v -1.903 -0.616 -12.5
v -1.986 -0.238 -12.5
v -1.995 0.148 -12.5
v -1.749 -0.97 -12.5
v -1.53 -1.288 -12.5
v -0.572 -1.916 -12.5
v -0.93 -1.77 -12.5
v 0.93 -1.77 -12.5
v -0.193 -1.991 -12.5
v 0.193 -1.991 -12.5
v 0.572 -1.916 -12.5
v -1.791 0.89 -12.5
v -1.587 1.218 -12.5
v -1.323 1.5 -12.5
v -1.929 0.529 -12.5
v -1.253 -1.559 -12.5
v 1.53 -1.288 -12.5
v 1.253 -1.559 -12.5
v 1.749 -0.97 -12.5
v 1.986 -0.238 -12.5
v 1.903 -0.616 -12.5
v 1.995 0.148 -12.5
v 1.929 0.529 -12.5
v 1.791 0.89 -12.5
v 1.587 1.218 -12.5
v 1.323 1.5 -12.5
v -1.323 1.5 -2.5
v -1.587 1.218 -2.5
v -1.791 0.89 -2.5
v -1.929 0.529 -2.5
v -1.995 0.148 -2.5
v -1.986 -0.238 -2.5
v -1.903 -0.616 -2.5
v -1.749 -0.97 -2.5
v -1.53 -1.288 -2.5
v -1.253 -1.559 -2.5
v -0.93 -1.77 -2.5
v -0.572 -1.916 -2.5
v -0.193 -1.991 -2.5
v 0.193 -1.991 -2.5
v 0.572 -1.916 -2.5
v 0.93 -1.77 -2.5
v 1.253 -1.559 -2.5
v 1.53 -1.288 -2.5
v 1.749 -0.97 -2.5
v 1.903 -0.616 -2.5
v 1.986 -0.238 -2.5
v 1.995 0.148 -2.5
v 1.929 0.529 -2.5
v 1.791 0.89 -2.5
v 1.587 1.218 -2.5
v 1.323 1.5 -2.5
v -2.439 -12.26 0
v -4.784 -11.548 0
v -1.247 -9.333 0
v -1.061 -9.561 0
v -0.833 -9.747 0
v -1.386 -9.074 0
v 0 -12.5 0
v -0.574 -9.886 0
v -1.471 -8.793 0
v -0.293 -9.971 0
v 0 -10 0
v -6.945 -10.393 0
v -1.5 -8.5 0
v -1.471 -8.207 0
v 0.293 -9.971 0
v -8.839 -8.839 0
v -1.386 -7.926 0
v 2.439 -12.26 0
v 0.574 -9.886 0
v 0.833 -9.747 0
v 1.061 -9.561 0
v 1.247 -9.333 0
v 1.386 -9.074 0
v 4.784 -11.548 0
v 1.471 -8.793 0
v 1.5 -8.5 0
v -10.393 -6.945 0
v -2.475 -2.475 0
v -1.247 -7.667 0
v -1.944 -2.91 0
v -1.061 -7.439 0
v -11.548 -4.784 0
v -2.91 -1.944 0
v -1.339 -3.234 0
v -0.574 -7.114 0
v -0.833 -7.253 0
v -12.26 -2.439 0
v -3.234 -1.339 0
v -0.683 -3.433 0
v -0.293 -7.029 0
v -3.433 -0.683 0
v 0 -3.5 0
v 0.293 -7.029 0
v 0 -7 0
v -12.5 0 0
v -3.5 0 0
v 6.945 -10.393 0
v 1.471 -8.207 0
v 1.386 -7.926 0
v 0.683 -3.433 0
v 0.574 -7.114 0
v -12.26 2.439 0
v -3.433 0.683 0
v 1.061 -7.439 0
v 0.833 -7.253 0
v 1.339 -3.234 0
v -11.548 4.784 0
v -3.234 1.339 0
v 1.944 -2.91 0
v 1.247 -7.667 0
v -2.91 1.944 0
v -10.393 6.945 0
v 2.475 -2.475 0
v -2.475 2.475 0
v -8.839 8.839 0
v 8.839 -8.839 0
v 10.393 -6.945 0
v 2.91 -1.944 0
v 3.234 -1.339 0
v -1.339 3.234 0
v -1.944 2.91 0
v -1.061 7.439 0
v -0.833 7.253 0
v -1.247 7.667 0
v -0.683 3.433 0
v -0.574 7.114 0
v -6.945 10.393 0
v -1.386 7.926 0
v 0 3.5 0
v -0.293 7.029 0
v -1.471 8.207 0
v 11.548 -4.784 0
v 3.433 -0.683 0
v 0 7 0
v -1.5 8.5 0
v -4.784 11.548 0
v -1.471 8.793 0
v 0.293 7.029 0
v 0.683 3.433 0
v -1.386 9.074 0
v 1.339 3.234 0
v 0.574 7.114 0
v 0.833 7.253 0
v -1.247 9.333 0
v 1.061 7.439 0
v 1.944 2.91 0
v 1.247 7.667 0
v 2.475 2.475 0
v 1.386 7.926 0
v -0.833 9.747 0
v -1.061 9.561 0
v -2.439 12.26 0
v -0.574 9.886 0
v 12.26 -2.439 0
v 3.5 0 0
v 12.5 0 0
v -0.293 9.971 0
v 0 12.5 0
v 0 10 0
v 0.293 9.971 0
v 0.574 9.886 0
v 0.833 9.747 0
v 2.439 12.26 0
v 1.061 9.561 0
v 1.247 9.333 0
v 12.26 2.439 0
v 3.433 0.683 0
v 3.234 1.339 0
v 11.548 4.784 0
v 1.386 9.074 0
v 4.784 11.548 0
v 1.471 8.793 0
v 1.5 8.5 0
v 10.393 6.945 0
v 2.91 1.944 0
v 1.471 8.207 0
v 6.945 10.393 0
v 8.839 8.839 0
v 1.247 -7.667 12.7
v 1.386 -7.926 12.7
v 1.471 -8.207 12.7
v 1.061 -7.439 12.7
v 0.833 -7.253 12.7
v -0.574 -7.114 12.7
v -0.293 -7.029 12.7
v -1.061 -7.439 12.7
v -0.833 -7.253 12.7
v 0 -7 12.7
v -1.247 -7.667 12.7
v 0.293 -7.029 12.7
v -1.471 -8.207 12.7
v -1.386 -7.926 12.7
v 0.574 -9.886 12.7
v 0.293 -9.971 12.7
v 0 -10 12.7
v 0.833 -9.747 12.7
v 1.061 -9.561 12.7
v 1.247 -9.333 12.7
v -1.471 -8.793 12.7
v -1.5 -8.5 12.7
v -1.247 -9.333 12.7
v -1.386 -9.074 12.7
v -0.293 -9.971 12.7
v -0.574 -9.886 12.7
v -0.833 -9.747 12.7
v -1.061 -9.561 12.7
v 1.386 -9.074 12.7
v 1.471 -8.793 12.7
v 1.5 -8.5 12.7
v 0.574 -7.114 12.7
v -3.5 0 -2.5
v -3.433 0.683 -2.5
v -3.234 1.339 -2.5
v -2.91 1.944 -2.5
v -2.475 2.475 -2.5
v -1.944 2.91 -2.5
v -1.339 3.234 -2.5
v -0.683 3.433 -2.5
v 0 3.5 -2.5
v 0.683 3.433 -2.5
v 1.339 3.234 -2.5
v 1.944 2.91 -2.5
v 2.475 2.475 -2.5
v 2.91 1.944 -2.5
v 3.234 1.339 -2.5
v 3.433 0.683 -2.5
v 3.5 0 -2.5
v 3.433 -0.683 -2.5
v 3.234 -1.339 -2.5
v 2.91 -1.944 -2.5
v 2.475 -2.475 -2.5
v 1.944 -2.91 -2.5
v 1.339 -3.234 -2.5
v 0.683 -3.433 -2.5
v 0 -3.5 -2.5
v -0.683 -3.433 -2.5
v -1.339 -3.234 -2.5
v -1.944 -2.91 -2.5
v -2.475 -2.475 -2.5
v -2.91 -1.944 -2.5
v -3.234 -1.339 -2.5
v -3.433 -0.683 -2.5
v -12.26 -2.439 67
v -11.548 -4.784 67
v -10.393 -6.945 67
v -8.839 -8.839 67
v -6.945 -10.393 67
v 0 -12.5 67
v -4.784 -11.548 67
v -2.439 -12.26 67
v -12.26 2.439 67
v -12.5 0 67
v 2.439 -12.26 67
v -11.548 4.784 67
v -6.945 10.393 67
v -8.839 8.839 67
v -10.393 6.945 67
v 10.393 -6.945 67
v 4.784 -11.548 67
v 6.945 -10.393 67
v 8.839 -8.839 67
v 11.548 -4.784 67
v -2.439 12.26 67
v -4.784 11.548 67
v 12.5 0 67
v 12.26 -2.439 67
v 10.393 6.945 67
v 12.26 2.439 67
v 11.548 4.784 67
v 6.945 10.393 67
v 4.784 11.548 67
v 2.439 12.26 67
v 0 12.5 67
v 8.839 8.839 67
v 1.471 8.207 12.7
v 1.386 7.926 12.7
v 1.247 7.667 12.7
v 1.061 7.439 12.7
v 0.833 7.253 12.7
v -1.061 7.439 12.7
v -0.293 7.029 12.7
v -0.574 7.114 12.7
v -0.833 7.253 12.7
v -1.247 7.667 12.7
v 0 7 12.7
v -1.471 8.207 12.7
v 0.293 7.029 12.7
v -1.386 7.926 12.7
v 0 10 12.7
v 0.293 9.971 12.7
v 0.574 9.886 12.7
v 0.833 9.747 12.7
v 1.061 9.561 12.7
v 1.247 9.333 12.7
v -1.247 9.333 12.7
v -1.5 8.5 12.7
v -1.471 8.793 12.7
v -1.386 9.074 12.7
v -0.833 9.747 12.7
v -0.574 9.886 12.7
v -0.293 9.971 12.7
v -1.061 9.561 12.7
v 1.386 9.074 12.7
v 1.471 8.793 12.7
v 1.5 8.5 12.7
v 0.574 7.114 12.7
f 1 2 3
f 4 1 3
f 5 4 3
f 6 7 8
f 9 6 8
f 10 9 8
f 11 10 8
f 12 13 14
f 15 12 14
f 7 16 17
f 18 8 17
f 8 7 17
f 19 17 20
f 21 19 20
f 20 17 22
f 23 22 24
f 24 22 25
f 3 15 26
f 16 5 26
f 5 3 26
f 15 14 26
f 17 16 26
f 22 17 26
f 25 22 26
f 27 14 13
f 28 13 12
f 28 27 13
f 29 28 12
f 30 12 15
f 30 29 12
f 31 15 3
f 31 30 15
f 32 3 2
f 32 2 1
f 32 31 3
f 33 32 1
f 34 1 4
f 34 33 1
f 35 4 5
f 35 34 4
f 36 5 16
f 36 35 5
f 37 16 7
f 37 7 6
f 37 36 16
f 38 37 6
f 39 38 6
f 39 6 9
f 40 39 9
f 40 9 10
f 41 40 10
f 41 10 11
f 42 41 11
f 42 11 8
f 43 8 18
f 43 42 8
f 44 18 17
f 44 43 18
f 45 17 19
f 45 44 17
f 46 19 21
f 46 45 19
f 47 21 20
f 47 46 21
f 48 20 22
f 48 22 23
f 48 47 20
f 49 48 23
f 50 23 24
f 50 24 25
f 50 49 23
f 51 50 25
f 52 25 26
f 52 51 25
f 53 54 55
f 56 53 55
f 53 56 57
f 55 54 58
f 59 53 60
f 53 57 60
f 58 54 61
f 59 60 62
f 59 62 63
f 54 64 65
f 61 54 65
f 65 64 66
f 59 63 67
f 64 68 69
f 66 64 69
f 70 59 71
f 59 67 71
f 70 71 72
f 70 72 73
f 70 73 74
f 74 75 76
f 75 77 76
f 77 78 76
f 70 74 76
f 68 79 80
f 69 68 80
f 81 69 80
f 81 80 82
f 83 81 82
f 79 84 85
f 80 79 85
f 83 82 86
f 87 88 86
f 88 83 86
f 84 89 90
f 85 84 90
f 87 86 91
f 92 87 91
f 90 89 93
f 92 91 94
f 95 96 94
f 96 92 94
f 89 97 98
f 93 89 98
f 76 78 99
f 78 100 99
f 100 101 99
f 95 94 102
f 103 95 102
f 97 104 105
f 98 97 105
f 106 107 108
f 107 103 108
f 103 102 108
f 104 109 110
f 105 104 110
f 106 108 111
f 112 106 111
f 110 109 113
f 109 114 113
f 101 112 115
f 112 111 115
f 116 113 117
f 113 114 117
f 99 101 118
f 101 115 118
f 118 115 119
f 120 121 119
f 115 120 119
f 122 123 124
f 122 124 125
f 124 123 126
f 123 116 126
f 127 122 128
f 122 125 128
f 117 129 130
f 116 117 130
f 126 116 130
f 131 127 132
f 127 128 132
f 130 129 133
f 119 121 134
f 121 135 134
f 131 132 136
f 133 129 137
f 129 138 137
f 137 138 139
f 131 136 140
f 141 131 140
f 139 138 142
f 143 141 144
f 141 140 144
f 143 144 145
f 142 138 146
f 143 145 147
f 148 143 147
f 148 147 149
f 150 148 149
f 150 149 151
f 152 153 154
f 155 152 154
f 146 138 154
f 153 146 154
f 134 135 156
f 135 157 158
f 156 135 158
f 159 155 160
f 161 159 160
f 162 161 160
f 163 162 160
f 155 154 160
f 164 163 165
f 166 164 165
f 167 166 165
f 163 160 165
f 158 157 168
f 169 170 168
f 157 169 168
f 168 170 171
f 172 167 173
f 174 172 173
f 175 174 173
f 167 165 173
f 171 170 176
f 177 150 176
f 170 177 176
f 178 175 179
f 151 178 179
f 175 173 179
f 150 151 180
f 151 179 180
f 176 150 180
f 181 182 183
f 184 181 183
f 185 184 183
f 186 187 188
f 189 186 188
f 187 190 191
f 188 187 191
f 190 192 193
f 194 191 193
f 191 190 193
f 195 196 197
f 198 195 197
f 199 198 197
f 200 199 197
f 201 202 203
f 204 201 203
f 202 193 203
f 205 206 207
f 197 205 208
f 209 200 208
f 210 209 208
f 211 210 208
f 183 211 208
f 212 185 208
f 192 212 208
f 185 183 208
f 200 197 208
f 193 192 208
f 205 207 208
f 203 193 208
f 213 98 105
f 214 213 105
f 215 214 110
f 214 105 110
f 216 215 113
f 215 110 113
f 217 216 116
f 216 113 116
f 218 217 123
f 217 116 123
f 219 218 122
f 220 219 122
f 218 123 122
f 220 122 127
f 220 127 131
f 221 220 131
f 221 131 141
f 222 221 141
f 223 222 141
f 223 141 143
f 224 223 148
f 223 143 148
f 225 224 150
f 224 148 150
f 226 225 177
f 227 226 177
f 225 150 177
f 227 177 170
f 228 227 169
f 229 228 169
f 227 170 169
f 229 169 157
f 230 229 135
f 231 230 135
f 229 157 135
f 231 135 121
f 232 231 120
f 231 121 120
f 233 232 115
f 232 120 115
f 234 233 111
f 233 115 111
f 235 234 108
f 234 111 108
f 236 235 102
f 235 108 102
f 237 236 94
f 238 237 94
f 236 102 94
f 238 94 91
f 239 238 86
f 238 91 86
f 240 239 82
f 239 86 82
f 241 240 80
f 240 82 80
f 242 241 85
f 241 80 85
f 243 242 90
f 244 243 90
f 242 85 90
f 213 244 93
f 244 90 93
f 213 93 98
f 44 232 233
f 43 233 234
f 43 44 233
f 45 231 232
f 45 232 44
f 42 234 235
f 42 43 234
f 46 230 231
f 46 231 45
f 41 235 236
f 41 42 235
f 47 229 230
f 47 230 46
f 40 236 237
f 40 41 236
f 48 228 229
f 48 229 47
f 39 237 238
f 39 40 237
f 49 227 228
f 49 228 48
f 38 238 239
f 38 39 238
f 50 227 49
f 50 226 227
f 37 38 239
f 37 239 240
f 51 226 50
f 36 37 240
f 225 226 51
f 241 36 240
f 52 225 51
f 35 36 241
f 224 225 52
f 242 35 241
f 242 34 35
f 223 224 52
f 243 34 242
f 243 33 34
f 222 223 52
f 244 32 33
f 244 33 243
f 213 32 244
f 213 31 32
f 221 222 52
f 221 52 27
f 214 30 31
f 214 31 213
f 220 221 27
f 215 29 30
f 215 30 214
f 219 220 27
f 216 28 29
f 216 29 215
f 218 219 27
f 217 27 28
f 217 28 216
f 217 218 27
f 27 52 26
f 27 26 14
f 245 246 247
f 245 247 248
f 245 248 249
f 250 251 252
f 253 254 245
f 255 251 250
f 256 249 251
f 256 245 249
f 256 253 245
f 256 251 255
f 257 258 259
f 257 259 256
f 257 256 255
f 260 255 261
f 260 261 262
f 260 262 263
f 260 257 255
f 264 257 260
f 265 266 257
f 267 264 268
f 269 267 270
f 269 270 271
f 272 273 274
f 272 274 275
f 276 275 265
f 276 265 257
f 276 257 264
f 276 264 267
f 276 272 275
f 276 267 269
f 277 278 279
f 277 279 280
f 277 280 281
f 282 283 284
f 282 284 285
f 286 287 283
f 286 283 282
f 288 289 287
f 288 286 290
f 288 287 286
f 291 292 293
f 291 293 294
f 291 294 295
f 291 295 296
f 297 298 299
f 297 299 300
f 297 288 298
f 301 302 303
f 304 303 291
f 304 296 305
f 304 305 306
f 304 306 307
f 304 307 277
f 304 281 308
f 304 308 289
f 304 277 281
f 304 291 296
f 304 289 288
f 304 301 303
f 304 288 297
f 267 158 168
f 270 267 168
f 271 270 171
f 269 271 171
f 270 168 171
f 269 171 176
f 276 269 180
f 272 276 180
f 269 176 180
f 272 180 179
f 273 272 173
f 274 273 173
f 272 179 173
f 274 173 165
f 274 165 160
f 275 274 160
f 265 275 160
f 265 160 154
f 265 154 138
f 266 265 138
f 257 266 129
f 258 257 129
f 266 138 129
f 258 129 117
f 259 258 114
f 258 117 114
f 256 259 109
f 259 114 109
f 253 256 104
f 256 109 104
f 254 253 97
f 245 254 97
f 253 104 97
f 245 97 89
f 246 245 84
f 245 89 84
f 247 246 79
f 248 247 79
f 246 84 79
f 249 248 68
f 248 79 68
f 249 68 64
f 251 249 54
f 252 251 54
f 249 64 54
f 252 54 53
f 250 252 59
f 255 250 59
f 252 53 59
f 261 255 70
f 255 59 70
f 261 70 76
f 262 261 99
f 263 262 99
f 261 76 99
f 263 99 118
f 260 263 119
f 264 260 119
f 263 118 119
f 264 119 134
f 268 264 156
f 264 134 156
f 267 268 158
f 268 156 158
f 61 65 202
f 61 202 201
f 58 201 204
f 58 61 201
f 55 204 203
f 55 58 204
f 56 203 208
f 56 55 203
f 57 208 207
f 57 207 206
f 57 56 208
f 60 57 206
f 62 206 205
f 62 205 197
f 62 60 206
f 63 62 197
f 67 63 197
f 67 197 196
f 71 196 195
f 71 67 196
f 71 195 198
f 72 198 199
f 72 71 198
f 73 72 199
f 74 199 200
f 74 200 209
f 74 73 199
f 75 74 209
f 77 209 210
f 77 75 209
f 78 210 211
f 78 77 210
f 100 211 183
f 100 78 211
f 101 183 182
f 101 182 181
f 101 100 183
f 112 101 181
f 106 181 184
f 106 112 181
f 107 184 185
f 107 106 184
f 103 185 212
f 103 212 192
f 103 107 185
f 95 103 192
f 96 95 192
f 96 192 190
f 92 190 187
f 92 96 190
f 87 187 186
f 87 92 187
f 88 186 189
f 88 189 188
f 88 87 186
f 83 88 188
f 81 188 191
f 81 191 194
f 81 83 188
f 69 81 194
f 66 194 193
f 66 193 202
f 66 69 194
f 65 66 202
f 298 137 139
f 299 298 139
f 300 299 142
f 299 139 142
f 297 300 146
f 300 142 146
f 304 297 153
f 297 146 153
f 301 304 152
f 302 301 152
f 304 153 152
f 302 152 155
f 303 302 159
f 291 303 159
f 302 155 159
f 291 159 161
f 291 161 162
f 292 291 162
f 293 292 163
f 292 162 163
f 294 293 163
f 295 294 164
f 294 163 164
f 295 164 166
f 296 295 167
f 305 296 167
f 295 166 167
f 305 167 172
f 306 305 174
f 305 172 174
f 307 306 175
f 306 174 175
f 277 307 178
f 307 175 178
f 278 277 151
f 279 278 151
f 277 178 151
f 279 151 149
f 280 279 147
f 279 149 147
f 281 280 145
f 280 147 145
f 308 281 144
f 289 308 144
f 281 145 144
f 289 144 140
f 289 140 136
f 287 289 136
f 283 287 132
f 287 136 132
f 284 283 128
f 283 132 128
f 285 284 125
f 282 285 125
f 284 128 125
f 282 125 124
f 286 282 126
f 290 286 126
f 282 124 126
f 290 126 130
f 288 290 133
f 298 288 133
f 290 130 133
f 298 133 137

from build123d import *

# Parameters (mm, degrees)
SKETCH1_R           = 12.5
BOSS_EXTRUDE1_DEPTH = 67
SKETCH2_R           = 3.5
BOSS_EXTRUDE2_DEPTH = 2.5
BOSS_EXTRUDE3_DEPTH = 10
SKETCH4_R           = 1.5
CUT_EXTRUDE1_DEPTH  = 12.7


with BuildPart() as part:
    # Sketch1 → Boss-Extrude1 (new body)
    with BuildSketch(Plane.XY):
        Circle(SKETCH1_R)
    extrude(amount=BOSS_EXTRUDE1_DEPTH)

    # Sketch2 → Boss-Extrude2 (add)
    with BuildSketch(Plane(origin=(0, 0, 0), x_dir=(-1, 0, 0), z_dir=(0, 0, -1))):
        Circle(SKETCH2_R)
    extrude(amount=BOSS_EXTRUDE2_DEPTH)

    # Sketch3 → Boss-Extrude3 (add)
    with BuildSketch(Plane(origin=(0, 0, -2.5), x_dir=(-1, 0, 0), z_dir=(0, 0, -1))):
        with BuildLine():
            Line((-1.322875656, 1.5), (1.322875656, 1.5))
            ThreePointArc((1.322875656, 1.5), (0, -2), (-1.322875656, 1.5))
        make_face()
    extrude(amount=BOSS_EXTRUDE3_DEPTH)

    # Sketch4 → Cut-Extrude1 (cut)
    with BuildSketch(Plane(origin=(0, 0, 0), x_dir=(-1, 0, 0), z_dir=(0, 0, -1))):
        with Locations((0, 8.5)):
            Circle(SKETCH4_R)
    cut_extrude1 = extrude(amount=-CUT_EXTRUDE1_DEPTH, mode=Mode.SUBTRACT)

    # Mirror1: Cut-Extrude1 across plane
    add(cut_extrude1.mirror(Plane.ZX), mode=Mode.SUBTRACT)


solid = part.part
